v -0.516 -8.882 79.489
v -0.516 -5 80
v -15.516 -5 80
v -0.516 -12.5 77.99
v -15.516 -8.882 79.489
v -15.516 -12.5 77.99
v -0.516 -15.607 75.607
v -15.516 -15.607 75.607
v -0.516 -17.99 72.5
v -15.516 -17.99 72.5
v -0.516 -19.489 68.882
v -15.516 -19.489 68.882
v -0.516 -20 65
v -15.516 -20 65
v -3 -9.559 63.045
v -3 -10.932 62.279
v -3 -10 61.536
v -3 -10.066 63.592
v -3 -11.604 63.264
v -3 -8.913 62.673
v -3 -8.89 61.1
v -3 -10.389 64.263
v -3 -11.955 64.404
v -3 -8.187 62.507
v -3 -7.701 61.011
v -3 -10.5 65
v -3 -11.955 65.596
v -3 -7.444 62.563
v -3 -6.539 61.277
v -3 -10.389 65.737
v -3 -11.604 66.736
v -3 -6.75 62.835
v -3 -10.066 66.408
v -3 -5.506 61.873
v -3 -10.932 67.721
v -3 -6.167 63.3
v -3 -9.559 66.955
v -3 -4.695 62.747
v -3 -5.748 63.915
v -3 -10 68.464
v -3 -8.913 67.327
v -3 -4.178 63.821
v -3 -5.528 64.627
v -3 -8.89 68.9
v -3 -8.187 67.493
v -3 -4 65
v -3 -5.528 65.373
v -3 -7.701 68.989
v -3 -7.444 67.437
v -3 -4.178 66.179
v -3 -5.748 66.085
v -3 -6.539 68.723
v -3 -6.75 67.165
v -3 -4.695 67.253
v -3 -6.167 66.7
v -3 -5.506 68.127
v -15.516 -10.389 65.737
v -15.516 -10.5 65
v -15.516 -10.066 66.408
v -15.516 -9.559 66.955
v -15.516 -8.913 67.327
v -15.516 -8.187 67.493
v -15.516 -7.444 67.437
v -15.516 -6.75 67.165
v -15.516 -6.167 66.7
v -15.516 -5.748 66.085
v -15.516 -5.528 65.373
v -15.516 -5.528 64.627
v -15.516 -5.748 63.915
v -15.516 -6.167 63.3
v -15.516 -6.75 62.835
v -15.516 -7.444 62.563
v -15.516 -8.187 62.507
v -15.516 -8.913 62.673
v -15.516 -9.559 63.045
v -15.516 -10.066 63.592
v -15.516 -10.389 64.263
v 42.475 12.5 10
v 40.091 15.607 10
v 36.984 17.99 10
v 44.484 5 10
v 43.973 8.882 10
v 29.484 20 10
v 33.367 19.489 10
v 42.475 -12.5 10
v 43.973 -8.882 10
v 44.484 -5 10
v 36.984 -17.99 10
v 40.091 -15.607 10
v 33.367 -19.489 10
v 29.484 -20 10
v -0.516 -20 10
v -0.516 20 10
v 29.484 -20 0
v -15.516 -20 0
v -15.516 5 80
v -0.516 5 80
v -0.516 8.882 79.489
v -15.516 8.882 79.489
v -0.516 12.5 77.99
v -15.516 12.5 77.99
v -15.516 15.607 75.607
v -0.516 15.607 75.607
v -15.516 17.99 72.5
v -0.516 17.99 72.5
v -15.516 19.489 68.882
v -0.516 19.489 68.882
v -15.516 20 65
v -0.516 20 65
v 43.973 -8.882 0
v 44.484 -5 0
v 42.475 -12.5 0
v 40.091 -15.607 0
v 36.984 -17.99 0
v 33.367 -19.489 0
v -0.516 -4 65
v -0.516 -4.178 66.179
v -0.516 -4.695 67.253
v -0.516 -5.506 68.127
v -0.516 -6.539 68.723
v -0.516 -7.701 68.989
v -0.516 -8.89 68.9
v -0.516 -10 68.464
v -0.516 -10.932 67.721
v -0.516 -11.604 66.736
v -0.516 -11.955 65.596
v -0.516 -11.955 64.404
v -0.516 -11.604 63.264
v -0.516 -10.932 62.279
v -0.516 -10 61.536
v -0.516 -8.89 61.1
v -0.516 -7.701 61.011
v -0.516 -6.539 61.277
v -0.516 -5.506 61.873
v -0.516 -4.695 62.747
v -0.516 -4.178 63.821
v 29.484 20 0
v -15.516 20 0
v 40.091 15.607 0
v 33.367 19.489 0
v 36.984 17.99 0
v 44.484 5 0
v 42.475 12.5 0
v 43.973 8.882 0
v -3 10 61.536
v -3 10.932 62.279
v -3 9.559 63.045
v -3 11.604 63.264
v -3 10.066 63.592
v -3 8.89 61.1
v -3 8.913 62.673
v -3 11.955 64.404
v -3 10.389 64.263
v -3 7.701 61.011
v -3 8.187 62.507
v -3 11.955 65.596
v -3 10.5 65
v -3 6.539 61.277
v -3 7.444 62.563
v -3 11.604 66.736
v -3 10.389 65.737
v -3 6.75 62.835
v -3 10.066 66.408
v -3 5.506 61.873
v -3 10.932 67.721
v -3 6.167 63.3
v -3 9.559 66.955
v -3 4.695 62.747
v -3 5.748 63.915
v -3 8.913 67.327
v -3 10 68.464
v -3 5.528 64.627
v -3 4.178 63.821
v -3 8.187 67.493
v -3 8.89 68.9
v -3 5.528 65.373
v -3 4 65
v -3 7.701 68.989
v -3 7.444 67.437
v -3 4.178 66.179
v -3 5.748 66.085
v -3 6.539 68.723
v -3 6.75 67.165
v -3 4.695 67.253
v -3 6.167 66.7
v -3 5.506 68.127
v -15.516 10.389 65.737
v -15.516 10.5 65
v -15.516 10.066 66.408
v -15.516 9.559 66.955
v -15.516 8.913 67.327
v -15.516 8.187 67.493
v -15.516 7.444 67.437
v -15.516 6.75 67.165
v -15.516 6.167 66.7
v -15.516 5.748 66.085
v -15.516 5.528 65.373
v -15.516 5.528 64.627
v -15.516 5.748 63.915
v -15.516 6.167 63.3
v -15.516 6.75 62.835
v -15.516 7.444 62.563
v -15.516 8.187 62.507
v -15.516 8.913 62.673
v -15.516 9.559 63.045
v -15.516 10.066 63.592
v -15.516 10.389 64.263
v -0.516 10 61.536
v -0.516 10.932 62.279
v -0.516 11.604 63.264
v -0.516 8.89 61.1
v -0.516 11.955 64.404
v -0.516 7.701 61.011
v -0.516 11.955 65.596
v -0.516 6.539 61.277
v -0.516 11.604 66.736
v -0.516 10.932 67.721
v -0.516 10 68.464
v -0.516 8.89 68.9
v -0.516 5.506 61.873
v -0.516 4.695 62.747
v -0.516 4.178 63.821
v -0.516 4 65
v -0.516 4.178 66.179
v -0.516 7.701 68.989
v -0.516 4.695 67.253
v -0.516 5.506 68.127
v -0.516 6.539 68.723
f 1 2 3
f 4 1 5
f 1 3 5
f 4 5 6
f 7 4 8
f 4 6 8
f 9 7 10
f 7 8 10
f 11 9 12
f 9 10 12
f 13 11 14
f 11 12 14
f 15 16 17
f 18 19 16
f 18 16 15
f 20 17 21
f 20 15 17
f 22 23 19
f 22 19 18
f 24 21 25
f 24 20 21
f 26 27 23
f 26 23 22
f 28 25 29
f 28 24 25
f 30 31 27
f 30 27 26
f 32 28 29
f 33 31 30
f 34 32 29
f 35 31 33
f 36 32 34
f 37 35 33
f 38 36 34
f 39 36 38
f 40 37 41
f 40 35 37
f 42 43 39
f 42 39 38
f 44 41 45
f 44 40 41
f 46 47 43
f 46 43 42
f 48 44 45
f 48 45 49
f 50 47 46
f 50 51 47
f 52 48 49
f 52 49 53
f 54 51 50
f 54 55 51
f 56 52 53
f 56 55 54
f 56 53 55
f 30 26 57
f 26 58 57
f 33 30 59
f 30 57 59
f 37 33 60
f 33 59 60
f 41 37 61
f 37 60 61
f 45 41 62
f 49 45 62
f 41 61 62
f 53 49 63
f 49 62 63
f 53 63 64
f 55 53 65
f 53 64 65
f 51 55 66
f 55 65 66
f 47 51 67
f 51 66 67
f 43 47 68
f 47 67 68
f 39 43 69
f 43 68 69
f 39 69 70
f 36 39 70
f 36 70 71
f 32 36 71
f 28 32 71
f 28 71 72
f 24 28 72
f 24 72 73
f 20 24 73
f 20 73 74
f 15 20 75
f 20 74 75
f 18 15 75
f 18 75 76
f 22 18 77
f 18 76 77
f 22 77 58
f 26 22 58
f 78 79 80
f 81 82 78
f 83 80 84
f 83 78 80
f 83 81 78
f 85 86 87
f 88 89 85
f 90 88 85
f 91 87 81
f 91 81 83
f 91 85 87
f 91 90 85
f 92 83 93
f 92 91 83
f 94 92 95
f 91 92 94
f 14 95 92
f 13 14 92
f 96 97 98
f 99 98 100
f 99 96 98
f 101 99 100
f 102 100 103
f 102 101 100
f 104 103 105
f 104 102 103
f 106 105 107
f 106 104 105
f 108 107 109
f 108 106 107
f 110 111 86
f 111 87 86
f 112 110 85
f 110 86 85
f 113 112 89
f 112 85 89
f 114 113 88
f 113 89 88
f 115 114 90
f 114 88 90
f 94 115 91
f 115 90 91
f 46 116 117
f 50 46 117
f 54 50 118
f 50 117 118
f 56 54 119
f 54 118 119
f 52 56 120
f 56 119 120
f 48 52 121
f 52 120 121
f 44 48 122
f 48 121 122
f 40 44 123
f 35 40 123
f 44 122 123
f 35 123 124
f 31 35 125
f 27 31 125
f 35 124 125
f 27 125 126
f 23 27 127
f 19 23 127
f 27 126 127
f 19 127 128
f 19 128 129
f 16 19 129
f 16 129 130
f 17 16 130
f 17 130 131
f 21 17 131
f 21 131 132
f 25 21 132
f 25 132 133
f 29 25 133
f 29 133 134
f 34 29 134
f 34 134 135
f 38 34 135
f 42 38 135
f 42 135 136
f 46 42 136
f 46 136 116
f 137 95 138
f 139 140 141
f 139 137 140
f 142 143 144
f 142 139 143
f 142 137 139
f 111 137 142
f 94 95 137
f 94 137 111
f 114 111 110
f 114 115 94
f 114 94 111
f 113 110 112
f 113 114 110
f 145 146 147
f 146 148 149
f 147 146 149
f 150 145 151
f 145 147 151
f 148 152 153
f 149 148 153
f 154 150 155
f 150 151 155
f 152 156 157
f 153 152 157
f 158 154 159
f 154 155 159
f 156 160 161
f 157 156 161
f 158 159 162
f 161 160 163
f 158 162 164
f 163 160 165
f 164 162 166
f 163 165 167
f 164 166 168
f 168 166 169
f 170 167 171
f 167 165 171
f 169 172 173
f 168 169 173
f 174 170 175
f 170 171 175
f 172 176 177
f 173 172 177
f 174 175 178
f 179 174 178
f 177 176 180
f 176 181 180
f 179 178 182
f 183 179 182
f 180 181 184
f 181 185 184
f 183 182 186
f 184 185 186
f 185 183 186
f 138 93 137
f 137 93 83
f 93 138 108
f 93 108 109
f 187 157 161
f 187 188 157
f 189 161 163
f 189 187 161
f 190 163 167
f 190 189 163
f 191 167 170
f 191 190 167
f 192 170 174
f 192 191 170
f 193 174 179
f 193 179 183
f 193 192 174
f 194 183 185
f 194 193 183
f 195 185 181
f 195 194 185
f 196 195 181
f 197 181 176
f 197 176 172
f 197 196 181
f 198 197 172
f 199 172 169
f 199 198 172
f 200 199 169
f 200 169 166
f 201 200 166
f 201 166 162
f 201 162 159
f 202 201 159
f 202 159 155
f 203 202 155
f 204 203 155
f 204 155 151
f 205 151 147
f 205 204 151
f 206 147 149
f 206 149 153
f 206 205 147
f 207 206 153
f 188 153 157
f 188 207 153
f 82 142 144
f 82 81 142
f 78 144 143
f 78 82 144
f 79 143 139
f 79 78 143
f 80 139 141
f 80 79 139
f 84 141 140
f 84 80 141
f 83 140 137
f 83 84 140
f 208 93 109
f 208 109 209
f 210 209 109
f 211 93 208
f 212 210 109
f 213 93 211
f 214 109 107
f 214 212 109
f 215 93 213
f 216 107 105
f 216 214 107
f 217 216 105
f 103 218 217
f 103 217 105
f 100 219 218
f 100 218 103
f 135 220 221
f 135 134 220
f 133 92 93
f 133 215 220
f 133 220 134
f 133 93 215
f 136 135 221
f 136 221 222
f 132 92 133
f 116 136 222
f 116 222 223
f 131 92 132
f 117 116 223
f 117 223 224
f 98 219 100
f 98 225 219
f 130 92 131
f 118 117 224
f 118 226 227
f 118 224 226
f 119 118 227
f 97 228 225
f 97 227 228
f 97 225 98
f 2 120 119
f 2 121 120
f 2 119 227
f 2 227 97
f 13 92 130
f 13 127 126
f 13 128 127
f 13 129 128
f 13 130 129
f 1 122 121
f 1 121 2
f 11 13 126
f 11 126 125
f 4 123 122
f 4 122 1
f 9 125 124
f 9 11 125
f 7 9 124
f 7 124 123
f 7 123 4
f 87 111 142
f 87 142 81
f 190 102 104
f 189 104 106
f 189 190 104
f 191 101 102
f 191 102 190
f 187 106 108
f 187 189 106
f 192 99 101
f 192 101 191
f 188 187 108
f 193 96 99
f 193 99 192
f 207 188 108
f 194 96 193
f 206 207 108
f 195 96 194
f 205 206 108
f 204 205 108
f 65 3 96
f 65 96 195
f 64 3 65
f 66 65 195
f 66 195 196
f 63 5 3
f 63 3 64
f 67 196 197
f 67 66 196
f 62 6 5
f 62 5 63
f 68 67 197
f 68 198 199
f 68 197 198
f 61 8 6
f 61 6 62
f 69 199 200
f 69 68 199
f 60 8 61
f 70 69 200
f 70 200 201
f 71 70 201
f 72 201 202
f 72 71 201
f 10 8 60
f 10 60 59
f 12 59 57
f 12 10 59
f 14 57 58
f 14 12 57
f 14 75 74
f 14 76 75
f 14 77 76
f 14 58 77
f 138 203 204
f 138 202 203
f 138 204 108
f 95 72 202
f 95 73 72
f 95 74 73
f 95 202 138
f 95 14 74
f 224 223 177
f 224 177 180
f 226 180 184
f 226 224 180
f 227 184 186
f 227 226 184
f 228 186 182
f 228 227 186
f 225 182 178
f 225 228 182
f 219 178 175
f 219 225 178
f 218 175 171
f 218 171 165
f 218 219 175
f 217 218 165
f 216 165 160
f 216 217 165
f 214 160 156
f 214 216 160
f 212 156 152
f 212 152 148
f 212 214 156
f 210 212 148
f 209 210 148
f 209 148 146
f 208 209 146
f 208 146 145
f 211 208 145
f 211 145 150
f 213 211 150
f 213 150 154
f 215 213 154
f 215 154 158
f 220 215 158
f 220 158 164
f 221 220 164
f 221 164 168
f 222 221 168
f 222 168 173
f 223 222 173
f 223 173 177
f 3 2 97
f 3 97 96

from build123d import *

# Parameters (mm, degrees)
PAD_DEPTH        = 20
FILLET_R         = 15
HOLE_D           = 5
HOLE_CBORE_D     = 8
HOLE_CBORE_DEPTH = 3


with BuildPart() as part:
    # Sketch → Pad (new body, symmetric)
    with BuildSketch(Plane.XZ):
        Polygon((-15.515675, 80), (-15.515675, 0), (44.484325, 0), (44.484325, 10), (-0.515675, 10), (-0.515675, 80), align=None)
    extrude(amount=PAD_DEPTH, both=True)

    # Fillet
    fillet_edges = [part.edges().sort_by_distance(p)[0] for p in [
        (-8.015675, 20, 80),
        (-8.015675, -20, 80),
        (44.484325, 20, 5),
        (44.484325, -20, 5),
    ]]
    fillet(fillet_edges, radius=FILLET_R)

    # Hole (through all)
    with Locations(Plane.YZ):
        with Locations((-8, 65)):
            hole = CounterBoreHole(HOLE_D / 2, HOLE_CBORE_D / 2, HOLE_CBORE_DEPTH)

    # Mirrored: Hole across XZ
    add(hole.mirror(Plane.XZ), mode=Mode.SUBTRACT)


solid = part.part
